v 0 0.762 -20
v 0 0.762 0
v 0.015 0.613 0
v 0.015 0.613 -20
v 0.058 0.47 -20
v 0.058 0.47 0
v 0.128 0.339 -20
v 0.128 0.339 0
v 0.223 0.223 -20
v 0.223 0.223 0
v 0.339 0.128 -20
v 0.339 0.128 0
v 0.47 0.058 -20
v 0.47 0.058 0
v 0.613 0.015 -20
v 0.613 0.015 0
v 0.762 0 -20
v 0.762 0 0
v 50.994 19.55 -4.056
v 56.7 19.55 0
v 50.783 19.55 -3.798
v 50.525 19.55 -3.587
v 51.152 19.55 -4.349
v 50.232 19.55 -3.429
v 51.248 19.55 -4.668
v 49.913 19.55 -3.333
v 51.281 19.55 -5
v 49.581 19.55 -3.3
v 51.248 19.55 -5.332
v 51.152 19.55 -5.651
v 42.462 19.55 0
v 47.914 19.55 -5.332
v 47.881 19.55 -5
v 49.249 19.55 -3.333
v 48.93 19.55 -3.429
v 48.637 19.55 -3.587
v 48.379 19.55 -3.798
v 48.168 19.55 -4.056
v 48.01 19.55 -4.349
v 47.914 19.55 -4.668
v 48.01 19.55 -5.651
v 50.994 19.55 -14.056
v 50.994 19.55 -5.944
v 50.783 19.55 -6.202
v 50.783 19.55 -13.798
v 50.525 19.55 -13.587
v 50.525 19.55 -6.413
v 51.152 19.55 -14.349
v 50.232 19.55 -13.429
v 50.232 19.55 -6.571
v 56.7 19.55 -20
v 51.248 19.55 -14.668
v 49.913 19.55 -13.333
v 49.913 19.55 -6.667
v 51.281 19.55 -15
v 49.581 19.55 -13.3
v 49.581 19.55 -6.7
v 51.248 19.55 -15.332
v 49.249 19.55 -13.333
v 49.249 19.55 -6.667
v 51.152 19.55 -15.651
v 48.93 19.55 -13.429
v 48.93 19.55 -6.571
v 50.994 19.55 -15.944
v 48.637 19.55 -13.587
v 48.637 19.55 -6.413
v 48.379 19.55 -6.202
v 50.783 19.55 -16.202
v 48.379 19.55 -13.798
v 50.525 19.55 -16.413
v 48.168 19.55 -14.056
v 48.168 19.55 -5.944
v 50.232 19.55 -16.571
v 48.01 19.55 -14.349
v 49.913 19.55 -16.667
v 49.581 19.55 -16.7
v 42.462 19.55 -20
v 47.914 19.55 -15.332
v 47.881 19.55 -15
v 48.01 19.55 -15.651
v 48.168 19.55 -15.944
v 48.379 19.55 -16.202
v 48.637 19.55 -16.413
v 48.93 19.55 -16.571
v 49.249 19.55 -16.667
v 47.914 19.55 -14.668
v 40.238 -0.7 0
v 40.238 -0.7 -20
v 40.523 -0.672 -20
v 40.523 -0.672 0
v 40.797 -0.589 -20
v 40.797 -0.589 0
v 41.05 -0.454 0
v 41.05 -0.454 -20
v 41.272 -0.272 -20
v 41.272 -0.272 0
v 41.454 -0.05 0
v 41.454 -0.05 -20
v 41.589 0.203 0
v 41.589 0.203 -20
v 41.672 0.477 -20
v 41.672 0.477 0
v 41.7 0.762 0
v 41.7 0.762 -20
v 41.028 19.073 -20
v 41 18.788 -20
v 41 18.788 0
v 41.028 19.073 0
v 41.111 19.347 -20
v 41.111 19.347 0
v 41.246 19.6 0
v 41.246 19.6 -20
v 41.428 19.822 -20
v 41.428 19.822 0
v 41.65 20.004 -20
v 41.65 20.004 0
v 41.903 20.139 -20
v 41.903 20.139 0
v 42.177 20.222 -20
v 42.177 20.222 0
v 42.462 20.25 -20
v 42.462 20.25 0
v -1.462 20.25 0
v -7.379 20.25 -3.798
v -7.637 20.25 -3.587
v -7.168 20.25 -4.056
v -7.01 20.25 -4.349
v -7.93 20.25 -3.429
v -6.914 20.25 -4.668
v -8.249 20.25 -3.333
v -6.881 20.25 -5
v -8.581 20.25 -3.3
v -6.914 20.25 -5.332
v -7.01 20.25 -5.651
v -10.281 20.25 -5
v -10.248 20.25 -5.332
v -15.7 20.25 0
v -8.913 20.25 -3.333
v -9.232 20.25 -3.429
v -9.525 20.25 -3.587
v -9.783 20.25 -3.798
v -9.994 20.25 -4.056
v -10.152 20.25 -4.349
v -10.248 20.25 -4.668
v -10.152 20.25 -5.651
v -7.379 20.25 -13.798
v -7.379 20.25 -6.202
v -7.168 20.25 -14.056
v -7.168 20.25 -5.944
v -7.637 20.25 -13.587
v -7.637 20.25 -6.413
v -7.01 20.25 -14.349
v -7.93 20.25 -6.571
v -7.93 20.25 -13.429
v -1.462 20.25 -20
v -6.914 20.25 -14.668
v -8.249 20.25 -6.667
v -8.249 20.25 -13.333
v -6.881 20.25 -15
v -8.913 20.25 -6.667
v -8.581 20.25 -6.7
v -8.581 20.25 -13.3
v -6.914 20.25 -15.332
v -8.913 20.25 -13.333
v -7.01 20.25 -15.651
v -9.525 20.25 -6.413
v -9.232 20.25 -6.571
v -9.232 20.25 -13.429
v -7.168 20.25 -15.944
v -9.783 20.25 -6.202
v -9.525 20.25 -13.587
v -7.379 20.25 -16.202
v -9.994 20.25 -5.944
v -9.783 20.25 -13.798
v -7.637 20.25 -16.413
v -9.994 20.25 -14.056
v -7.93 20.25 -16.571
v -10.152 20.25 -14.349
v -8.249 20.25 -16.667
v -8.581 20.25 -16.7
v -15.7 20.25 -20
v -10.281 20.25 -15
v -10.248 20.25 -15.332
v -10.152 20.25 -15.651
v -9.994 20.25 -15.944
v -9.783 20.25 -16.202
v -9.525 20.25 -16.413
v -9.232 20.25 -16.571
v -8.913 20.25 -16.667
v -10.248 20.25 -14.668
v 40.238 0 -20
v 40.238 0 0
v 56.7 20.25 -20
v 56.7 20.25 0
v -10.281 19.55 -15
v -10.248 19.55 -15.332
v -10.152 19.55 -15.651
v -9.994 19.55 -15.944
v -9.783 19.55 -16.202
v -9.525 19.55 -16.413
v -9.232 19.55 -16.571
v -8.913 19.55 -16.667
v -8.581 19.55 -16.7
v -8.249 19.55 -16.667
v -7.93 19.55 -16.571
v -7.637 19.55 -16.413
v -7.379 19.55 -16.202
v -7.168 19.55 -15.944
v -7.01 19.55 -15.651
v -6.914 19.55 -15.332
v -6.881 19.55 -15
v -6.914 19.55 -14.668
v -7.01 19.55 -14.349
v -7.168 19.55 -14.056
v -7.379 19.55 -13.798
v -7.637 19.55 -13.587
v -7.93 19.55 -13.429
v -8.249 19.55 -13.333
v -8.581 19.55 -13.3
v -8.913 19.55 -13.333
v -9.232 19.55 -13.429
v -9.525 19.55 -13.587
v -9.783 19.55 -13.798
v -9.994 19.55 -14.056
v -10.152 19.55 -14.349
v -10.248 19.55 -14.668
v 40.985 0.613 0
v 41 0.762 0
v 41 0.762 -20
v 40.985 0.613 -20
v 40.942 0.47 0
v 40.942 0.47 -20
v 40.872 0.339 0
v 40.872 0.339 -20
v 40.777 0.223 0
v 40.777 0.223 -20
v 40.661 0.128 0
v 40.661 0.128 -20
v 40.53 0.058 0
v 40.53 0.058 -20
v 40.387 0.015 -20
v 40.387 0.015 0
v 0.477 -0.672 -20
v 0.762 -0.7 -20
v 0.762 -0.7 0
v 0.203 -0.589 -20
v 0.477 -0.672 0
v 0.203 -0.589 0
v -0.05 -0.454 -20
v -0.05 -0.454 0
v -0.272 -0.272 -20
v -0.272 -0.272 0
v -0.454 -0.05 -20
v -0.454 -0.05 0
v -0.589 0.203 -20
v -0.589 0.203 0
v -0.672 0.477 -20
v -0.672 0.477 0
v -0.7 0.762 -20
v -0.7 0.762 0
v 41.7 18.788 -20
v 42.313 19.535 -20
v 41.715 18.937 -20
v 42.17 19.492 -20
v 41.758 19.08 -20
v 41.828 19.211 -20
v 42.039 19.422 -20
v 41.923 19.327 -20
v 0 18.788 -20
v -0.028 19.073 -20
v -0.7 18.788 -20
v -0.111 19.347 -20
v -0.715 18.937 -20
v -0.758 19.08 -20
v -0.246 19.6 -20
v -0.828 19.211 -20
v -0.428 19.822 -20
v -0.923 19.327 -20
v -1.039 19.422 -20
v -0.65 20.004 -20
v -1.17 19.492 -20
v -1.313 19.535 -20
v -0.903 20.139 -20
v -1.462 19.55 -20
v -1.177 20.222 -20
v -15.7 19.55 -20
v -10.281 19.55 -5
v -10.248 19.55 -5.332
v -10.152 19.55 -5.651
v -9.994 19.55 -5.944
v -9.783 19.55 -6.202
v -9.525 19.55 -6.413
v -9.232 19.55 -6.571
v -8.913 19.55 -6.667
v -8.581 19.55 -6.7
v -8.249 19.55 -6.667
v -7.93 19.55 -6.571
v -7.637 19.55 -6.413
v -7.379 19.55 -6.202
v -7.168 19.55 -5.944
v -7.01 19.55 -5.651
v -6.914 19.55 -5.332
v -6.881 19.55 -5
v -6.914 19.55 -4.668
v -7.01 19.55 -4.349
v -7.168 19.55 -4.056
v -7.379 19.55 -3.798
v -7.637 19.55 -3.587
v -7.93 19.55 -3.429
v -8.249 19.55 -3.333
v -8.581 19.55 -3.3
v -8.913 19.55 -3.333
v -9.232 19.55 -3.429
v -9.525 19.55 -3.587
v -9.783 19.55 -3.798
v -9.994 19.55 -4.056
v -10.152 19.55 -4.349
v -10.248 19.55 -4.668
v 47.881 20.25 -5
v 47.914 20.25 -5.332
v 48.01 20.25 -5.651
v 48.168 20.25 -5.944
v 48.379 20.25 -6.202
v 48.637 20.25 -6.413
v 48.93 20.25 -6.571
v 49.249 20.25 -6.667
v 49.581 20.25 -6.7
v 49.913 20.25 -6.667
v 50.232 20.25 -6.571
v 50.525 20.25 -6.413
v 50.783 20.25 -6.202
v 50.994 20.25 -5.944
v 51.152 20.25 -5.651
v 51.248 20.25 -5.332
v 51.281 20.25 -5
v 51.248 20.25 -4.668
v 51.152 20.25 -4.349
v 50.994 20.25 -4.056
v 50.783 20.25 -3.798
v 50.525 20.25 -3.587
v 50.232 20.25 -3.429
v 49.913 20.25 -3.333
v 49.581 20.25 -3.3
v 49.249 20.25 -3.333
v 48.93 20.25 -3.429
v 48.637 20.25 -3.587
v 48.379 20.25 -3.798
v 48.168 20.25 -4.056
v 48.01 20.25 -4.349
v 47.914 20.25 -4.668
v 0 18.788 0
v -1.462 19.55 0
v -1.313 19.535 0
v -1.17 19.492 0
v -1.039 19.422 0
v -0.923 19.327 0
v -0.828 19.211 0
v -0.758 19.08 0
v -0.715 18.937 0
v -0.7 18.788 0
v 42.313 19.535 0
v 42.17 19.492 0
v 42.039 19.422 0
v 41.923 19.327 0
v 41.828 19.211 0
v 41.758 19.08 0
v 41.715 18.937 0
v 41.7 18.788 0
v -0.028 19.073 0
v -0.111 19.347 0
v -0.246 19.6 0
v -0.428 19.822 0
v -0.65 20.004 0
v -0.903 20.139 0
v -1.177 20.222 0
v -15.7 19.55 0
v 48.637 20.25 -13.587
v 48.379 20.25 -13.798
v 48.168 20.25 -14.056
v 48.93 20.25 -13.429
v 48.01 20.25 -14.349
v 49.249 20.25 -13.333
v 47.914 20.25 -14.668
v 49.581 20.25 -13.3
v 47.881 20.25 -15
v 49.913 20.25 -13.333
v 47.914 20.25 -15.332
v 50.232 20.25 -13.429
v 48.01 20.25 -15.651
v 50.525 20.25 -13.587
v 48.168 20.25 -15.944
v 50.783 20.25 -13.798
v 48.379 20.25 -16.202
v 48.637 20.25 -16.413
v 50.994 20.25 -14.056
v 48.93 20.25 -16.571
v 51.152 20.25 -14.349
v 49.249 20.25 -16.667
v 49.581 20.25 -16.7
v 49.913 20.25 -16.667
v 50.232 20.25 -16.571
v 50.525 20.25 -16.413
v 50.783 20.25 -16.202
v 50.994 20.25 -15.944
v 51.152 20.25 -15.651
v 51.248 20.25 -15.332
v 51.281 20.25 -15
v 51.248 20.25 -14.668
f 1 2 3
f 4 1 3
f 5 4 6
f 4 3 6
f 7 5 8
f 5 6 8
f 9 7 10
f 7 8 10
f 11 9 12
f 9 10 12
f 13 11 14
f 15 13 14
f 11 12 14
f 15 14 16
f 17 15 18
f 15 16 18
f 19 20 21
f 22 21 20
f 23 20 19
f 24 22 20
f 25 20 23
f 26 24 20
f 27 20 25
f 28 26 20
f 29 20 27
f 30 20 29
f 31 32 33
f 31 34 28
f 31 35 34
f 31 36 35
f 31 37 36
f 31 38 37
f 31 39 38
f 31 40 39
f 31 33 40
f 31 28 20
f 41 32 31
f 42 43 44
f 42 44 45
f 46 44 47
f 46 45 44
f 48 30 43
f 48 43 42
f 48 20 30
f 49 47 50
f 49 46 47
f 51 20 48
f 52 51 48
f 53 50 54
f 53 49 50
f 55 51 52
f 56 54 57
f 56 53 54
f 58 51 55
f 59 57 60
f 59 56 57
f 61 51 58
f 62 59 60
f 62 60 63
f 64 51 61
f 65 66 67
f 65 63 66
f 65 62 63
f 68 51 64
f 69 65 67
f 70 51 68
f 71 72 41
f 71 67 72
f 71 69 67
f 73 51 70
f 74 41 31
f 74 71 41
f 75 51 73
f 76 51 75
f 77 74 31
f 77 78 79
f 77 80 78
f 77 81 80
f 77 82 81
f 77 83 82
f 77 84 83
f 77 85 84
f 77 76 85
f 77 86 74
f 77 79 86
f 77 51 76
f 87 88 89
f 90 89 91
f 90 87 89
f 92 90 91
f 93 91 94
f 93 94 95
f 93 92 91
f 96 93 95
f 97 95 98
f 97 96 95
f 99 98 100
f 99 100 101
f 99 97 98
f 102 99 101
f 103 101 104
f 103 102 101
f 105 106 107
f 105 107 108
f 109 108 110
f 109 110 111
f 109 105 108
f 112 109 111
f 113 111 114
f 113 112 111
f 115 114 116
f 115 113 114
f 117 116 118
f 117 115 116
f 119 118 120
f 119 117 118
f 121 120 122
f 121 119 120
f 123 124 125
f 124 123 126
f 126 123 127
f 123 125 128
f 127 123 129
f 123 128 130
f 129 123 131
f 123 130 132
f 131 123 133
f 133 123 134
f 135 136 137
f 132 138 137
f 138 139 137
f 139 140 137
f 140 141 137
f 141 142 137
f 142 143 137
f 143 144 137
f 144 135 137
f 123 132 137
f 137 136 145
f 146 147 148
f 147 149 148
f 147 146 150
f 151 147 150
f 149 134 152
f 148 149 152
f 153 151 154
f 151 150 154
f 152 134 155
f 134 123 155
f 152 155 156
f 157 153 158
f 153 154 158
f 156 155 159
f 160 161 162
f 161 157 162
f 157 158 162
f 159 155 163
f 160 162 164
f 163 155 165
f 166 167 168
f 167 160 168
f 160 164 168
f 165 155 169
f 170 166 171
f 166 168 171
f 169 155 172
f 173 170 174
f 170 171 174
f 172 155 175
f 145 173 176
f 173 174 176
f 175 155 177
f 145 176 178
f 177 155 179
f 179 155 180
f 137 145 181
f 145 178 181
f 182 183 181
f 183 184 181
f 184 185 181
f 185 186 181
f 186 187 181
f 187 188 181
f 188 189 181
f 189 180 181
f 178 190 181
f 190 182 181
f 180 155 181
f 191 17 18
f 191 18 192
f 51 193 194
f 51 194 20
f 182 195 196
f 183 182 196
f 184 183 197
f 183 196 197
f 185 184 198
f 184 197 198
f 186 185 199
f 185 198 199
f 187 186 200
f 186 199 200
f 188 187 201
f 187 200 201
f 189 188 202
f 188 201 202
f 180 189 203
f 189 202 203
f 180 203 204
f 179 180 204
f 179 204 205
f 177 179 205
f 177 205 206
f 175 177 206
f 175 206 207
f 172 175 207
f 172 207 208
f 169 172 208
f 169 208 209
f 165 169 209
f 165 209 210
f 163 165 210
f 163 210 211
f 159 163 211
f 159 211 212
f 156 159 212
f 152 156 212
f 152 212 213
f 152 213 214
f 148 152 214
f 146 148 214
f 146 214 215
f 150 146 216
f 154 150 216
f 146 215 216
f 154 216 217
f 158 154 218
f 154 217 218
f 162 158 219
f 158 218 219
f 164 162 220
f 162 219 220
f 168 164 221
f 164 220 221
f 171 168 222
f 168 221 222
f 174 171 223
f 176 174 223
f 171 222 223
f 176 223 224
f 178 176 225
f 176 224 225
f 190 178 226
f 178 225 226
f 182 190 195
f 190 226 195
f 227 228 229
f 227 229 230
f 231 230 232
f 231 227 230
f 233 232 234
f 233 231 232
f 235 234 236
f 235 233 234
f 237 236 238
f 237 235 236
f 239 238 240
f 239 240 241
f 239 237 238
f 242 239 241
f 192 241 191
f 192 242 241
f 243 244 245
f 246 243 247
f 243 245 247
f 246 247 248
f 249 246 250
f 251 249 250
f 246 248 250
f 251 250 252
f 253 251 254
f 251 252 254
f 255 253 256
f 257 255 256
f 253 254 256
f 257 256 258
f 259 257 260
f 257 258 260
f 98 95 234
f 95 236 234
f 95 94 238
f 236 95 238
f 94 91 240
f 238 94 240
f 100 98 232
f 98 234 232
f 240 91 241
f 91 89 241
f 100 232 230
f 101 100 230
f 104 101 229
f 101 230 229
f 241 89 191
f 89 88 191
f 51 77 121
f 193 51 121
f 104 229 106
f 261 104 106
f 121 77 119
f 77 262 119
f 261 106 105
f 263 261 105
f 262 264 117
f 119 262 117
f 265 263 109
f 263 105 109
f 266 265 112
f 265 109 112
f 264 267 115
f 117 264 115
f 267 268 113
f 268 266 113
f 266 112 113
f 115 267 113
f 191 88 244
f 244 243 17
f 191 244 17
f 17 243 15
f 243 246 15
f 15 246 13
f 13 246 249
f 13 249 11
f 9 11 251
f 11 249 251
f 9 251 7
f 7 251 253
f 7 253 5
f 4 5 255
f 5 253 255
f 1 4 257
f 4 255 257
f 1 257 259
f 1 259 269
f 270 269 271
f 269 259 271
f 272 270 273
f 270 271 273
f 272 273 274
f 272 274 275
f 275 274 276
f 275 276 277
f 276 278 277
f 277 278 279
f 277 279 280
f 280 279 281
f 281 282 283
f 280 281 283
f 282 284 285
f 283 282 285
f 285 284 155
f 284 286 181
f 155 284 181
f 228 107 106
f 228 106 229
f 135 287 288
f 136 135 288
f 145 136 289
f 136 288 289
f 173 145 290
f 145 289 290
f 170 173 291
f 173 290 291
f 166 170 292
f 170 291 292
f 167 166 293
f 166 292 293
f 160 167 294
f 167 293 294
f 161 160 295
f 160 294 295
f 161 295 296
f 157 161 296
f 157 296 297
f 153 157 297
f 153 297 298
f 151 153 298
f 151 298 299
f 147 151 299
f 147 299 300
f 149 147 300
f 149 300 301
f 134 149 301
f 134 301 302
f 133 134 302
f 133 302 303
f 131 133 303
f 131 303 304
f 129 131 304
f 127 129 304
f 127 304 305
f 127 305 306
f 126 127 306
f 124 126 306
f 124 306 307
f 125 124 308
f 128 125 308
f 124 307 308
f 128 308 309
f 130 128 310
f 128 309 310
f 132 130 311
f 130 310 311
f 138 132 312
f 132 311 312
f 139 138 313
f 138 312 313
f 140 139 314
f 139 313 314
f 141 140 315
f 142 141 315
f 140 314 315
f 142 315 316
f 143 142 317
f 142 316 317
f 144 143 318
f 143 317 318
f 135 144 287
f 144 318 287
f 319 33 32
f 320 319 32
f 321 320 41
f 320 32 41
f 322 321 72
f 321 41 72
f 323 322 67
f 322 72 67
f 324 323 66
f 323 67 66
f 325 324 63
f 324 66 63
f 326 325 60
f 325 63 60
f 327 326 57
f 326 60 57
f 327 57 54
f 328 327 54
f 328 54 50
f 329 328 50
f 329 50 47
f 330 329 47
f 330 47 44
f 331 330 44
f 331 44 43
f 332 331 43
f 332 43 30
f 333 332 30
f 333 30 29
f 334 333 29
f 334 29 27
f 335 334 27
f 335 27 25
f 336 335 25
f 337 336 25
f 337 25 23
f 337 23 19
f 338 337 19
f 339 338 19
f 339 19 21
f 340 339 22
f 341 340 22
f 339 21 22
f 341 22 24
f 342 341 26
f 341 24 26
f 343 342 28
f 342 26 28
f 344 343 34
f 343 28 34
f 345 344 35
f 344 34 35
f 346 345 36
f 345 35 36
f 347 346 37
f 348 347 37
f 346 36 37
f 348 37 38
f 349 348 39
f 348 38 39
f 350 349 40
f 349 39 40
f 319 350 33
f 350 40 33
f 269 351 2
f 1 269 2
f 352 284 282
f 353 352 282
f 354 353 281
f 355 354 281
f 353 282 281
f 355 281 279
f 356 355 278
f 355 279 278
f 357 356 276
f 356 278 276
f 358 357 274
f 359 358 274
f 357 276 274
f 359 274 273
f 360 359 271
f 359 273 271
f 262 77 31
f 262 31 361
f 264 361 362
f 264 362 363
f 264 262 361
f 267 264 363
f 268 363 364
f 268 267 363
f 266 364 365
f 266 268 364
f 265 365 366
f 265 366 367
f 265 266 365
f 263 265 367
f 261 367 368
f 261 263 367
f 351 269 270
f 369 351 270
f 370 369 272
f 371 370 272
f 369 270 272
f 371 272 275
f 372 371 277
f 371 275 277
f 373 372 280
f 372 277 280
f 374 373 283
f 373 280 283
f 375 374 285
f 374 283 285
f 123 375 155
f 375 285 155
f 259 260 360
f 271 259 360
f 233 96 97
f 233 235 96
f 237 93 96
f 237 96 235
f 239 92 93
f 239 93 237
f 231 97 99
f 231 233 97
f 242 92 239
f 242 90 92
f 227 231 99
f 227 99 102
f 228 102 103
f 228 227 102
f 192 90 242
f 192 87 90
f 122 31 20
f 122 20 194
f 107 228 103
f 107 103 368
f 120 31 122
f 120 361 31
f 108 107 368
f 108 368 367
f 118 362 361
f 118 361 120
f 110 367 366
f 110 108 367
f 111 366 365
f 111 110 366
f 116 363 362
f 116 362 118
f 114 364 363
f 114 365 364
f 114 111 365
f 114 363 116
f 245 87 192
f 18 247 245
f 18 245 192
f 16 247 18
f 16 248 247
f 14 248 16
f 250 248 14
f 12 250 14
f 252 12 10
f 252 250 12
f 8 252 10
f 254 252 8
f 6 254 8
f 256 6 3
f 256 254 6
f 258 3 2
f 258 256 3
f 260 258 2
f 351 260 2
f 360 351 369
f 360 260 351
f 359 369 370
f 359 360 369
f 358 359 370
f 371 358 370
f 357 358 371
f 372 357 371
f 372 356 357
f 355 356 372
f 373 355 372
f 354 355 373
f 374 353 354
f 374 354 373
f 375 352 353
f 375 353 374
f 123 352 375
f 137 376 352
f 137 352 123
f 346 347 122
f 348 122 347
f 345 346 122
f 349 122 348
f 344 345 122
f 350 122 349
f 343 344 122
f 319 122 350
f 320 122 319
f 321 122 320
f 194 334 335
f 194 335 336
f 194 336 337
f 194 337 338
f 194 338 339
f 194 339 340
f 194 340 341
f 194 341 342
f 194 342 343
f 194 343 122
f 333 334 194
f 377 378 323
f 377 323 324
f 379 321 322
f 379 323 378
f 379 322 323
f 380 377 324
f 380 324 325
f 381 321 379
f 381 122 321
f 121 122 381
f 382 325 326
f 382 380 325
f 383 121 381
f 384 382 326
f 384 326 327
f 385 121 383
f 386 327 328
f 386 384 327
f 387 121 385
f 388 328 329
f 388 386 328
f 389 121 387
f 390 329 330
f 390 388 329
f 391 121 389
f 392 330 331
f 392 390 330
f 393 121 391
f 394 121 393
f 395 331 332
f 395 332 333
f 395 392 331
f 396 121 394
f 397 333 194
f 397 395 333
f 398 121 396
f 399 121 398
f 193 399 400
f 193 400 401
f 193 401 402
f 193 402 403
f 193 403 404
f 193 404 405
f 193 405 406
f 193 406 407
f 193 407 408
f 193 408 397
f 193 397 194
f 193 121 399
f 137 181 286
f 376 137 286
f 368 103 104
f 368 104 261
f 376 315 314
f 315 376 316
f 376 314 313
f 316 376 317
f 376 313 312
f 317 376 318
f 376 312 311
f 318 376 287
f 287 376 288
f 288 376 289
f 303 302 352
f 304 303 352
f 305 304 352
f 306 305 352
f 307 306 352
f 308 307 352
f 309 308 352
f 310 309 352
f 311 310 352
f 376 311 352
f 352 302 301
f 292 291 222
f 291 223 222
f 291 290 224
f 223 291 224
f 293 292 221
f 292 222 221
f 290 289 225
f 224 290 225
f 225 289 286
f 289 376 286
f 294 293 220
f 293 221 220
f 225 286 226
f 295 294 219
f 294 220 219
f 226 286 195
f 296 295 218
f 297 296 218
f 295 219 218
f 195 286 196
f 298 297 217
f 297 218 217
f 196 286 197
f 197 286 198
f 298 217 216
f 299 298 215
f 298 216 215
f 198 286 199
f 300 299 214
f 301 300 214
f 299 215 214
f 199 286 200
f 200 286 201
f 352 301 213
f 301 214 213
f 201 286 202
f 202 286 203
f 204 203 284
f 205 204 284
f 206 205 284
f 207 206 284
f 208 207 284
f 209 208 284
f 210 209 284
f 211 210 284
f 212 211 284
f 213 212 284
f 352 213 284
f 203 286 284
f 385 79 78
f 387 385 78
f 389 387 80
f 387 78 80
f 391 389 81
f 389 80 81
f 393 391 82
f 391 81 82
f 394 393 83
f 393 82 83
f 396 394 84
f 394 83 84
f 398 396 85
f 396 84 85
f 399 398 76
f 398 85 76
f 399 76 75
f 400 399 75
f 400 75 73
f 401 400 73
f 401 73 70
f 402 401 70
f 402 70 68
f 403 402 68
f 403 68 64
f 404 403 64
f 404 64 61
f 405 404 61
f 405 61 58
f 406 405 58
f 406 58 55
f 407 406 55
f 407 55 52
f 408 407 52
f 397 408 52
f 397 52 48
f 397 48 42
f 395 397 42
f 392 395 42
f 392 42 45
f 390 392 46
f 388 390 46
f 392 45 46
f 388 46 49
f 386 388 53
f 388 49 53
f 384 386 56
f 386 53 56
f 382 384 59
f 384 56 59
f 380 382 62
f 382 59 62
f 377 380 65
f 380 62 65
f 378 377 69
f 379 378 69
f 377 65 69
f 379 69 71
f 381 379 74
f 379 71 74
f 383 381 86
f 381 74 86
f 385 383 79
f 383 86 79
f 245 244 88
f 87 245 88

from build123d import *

# Parameters (mm, degrees)
SKETCH1_W                    = 41
SKETCH1_H                    = 20
BASE_FLANGE1_DEPTH           = 0.7
EDGE_FLANGE1_STRIP_W         = 4.324
EDGE_FLANGE1_STRIP_H         = 0.7
EDGE_FLANGE1_STRIP_CUT_DEPTH = 20
EDGE_FLANGE1_DEPTH           = 20
EDGE_FLANGE2_STRIP_W         = 4.324
EDGE_FLANGE2_STRIP_H         = 0.7
EDGE_FLANGE2_STRIP_CUT_DEPTH = 20
EDGE_FLANGE2_DEPTH           = 20
M3_CLEARANCE_HOLE1_D         = 3.4


# Sheet-metal steps are written as plain solids
with BuildPart() as part:
    # Sketch1 → Base-Flange1 (new body)
    with BuildSketch(Plane(origin=(0, 0, 0), x_dir=(1, 0, 0), z_dir=(0, 1, 0))):
        with Locations((20.5, 10)):
            Rectangle(SKETCH1_W, SKETCH1_H)
    extrude(amount=-BASE_FLANGE1_DEPTH)

    # Edge-Flange1 strip (across the edge) → Edge-Flange1 strip cut (cut)
    with BuildSketch(Plane(origin=(41, 0, 0), x_dir=(-1, 0, 0), z_dir=(0, 0, -1))):
        with Locations((-1.4, -0.35)):
            Rectangle(EDGE_FLANGE1_STRIP_W, EDGE_FLANGE1_STRIP_H)
    edge_flange1_strip_cut = extrude(amount=EDGE_FLANGE1_STRIP_CUT_DEPTH, mode=Mode.SUBTRACT)

    # Edge-Flange1 section (across the edge) → Edge-Flange1 (add)
    with BuildSketch(Plane(origin=(41, 0, 0), x_dir=(-1, 0, 0), z_dir=(0, 0, -1))):
        with BuildLine():
            Line((-0.7, 0.762), (-0.7, 20.25))
            Line((-0.7, 20.25), (0, 20.25))
            Line((0, 20.25), (0, 0.762))
            ThreePointArc((0, 0.762), (0.223184633, 0.223184633), (0.762, 0))
            Line((0.762, 0), (0.762, -0.7))
            ThreePointArc((0.762, -0.7), (-0.271790114, -0.271790114), (-0.7, 0.762))
        make_face()
    edge_flange1 = extrude(amount=EDGE_FLANGE1_DEPTH)

    # Edge-Flange2 strip (across the edge) → Edge-Flange2 strip cut (cut)
    with BuildSketch(Plane(origin=(41.7, 20.25, -20), x_dir=(0, -1, 0), z_dir=(0, 0, 1))):
        with Locations((-0.7, -0.35)):
            Rectangle(EDGE_FLANGE2_STRIP_W, EDGE_FLANGE2_STRIP_H)
    edge_flange2_strip_cut = extrude(amount=EDGE_FLANGE2_STRIP_CUT_DEPTH, mode=Mode.SUBTRACT)

    # Edge-Flange2 section (across the edge) → Edge-Flange2 (add)
    with BuildSketch(Plane(origin=(41.7, 20.25, -20), x_dir=(0, -1, 0), z_dir=(0, 0, 1))):
        with BuildLine():
            Line((0, 0.762), (0, 15))
            Line((0, 15), (0.7, 15))
            Line((0.7, 15), (0.7, 0.762))
            ThreePointArc((0.7, 0.762), (0.923184633, 0.223184633), (1.462, 0))
            Line((1.462, 0), (1.462, -0.7))
            ThreePointArc((1.462, -0.7), (0.428209886, -0.271790114), (0, 0.762))
        make_face()
    edge_flange2 = extrude(amount=EDGE_FLANGE2_DEPTH)

    # Mirror1: Edge-Flange1 strip cut, Edge-Flange1, Edge-Flange2 strip cut, Edge-Flange2 across plane
    add(edge_flange1_strip_cut.mirror(Plane(origin=(20.5, 0, 0), x_dir=(0, 0, 1), z_dir=(1, 0, 0))), mode=Mode.SUBTRACT)
    add(edge_flange1.mirror(Plane(origin=(20.5, 0, 0), x_dir=(0, 0, 1), z_dir=(1, 0, 0))))
    add(edge_flange2_strip_cut.mirror(Plane(origin=(20.5, 0, 0), x_dir=(0, 0, 1), z_dir=(1, 0, 0))), mode=Mode.SUBTRACT)
    add(edge_flange2.mirror(Plane(origin=(20.5, 0, 0), x_dir=(0, 0, 1), z_dir=(1, 0, 0))))

    # M3 Clearance Hole1 (through all)
    with Locations(Plane(origin=(0, 20.25, 0), x_dir=(1, 0, 0), z_dir=(0, 1, 0))):
        with Locations((49.581, 15), (49.581, 5), (-8.581, 15), (-8.581, 5)):
            Hole(M3_CLEARANCE_HOLE1_D / 2)


solid = part.part
